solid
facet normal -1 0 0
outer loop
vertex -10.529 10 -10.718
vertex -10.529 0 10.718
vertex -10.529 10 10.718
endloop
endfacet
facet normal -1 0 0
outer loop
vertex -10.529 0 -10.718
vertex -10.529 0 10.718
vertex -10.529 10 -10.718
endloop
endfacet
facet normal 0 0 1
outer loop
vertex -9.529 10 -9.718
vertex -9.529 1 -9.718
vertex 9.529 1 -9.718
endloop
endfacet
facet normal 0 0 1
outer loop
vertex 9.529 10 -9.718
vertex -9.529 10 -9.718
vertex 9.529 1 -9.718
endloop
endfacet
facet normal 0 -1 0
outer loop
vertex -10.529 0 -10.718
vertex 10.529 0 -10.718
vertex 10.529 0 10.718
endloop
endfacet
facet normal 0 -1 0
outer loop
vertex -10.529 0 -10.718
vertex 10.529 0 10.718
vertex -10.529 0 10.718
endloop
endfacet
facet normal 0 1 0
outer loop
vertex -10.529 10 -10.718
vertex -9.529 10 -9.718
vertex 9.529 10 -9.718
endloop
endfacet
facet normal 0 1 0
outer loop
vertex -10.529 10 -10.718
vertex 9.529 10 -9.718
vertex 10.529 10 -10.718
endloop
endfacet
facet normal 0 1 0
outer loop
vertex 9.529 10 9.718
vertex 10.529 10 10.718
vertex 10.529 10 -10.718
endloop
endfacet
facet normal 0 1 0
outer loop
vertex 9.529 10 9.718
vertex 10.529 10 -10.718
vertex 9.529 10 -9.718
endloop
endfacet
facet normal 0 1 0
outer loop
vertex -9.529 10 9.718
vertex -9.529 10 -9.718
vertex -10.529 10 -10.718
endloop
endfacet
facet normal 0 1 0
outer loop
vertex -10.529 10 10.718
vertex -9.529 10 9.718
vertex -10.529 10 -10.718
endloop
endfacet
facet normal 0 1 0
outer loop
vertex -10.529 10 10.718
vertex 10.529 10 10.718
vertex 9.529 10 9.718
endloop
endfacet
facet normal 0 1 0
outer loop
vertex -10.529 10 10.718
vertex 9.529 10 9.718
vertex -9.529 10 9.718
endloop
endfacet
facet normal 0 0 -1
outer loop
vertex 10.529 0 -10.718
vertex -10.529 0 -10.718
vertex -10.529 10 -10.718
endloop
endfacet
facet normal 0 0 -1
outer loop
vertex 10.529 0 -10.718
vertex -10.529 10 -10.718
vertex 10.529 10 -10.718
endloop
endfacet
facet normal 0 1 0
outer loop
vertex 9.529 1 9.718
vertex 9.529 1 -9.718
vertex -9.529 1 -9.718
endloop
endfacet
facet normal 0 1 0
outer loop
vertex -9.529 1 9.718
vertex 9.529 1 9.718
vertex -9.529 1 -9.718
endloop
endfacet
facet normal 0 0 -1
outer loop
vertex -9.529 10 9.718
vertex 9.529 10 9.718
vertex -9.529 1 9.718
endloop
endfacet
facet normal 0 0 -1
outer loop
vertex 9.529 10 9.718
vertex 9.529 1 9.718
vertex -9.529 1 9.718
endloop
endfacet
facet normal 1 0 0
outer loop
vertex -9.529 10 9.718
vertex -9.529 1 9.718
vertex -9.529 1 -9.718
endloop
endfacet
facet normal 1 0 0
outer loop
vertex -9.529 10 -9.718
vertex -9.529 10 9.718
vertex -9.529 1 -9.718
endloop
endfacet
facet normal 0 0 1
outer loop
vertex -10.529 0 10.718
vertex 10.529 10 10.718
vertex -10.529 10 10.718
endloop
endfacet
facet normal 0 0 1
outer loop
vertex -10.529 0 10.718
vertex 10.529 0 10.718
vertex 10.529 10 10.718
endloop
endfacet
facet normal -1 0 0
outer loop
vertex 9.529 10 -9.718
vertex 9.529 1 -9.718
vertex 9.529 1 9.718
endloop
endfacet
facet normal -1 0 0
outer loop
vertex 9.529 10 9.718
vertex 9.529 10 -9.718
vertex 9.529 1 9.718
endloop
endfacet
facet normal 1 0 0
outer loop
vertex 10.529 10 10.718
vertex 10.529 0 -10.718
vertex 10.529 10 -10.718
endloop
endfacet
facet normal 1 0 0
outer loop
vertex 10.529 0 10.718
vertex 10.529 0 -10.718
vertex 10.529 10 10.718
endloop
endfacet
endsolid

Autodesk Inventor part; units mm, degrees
ref_plane "YZ Plane" through (0, 0, 0) normal (1, 0, 0) x (0, 1, 0)
ref_plane "XZ Plane" through (0, 0, 0) normal (0, 1, 0) x (-1, 0, 0)
ref_plane "XY Plane" through (0, 0, 0) normal (0, 0, 1) x (1, 0, 0)
sketch "Sketch1" plane through (0, 0, 0) normal (0, 1, 0) x (-1, 0, 0)
  line L0 (10.5287, -10.7178) -> (-10.5287, -10.7178)
  line L1 (-10.5287, -10.7178) -> (-10.5287, 10.7178)
  line L2 (-10.5287, 10.7178) -> (10.5287, 10.7178)
  line L3 (10.5287, 10.7178) -> (10.5287, -10.7178)
  line L4 (10.5287, -10.7178) -> (-10.5287, 10.7178) construction
  line L5 (-10.5287, -10.7178) -> (10.5287, 10.7178) construction
  point P0 (0, 0)
extrude "Extrusion1" add sketch "Sketch1" along normal blind 10
shell "Shell1" thickness 1 removed faces 1 at (-3.5096, 10, -3.5726)
properties part number "Midsurf - DiffThick"
